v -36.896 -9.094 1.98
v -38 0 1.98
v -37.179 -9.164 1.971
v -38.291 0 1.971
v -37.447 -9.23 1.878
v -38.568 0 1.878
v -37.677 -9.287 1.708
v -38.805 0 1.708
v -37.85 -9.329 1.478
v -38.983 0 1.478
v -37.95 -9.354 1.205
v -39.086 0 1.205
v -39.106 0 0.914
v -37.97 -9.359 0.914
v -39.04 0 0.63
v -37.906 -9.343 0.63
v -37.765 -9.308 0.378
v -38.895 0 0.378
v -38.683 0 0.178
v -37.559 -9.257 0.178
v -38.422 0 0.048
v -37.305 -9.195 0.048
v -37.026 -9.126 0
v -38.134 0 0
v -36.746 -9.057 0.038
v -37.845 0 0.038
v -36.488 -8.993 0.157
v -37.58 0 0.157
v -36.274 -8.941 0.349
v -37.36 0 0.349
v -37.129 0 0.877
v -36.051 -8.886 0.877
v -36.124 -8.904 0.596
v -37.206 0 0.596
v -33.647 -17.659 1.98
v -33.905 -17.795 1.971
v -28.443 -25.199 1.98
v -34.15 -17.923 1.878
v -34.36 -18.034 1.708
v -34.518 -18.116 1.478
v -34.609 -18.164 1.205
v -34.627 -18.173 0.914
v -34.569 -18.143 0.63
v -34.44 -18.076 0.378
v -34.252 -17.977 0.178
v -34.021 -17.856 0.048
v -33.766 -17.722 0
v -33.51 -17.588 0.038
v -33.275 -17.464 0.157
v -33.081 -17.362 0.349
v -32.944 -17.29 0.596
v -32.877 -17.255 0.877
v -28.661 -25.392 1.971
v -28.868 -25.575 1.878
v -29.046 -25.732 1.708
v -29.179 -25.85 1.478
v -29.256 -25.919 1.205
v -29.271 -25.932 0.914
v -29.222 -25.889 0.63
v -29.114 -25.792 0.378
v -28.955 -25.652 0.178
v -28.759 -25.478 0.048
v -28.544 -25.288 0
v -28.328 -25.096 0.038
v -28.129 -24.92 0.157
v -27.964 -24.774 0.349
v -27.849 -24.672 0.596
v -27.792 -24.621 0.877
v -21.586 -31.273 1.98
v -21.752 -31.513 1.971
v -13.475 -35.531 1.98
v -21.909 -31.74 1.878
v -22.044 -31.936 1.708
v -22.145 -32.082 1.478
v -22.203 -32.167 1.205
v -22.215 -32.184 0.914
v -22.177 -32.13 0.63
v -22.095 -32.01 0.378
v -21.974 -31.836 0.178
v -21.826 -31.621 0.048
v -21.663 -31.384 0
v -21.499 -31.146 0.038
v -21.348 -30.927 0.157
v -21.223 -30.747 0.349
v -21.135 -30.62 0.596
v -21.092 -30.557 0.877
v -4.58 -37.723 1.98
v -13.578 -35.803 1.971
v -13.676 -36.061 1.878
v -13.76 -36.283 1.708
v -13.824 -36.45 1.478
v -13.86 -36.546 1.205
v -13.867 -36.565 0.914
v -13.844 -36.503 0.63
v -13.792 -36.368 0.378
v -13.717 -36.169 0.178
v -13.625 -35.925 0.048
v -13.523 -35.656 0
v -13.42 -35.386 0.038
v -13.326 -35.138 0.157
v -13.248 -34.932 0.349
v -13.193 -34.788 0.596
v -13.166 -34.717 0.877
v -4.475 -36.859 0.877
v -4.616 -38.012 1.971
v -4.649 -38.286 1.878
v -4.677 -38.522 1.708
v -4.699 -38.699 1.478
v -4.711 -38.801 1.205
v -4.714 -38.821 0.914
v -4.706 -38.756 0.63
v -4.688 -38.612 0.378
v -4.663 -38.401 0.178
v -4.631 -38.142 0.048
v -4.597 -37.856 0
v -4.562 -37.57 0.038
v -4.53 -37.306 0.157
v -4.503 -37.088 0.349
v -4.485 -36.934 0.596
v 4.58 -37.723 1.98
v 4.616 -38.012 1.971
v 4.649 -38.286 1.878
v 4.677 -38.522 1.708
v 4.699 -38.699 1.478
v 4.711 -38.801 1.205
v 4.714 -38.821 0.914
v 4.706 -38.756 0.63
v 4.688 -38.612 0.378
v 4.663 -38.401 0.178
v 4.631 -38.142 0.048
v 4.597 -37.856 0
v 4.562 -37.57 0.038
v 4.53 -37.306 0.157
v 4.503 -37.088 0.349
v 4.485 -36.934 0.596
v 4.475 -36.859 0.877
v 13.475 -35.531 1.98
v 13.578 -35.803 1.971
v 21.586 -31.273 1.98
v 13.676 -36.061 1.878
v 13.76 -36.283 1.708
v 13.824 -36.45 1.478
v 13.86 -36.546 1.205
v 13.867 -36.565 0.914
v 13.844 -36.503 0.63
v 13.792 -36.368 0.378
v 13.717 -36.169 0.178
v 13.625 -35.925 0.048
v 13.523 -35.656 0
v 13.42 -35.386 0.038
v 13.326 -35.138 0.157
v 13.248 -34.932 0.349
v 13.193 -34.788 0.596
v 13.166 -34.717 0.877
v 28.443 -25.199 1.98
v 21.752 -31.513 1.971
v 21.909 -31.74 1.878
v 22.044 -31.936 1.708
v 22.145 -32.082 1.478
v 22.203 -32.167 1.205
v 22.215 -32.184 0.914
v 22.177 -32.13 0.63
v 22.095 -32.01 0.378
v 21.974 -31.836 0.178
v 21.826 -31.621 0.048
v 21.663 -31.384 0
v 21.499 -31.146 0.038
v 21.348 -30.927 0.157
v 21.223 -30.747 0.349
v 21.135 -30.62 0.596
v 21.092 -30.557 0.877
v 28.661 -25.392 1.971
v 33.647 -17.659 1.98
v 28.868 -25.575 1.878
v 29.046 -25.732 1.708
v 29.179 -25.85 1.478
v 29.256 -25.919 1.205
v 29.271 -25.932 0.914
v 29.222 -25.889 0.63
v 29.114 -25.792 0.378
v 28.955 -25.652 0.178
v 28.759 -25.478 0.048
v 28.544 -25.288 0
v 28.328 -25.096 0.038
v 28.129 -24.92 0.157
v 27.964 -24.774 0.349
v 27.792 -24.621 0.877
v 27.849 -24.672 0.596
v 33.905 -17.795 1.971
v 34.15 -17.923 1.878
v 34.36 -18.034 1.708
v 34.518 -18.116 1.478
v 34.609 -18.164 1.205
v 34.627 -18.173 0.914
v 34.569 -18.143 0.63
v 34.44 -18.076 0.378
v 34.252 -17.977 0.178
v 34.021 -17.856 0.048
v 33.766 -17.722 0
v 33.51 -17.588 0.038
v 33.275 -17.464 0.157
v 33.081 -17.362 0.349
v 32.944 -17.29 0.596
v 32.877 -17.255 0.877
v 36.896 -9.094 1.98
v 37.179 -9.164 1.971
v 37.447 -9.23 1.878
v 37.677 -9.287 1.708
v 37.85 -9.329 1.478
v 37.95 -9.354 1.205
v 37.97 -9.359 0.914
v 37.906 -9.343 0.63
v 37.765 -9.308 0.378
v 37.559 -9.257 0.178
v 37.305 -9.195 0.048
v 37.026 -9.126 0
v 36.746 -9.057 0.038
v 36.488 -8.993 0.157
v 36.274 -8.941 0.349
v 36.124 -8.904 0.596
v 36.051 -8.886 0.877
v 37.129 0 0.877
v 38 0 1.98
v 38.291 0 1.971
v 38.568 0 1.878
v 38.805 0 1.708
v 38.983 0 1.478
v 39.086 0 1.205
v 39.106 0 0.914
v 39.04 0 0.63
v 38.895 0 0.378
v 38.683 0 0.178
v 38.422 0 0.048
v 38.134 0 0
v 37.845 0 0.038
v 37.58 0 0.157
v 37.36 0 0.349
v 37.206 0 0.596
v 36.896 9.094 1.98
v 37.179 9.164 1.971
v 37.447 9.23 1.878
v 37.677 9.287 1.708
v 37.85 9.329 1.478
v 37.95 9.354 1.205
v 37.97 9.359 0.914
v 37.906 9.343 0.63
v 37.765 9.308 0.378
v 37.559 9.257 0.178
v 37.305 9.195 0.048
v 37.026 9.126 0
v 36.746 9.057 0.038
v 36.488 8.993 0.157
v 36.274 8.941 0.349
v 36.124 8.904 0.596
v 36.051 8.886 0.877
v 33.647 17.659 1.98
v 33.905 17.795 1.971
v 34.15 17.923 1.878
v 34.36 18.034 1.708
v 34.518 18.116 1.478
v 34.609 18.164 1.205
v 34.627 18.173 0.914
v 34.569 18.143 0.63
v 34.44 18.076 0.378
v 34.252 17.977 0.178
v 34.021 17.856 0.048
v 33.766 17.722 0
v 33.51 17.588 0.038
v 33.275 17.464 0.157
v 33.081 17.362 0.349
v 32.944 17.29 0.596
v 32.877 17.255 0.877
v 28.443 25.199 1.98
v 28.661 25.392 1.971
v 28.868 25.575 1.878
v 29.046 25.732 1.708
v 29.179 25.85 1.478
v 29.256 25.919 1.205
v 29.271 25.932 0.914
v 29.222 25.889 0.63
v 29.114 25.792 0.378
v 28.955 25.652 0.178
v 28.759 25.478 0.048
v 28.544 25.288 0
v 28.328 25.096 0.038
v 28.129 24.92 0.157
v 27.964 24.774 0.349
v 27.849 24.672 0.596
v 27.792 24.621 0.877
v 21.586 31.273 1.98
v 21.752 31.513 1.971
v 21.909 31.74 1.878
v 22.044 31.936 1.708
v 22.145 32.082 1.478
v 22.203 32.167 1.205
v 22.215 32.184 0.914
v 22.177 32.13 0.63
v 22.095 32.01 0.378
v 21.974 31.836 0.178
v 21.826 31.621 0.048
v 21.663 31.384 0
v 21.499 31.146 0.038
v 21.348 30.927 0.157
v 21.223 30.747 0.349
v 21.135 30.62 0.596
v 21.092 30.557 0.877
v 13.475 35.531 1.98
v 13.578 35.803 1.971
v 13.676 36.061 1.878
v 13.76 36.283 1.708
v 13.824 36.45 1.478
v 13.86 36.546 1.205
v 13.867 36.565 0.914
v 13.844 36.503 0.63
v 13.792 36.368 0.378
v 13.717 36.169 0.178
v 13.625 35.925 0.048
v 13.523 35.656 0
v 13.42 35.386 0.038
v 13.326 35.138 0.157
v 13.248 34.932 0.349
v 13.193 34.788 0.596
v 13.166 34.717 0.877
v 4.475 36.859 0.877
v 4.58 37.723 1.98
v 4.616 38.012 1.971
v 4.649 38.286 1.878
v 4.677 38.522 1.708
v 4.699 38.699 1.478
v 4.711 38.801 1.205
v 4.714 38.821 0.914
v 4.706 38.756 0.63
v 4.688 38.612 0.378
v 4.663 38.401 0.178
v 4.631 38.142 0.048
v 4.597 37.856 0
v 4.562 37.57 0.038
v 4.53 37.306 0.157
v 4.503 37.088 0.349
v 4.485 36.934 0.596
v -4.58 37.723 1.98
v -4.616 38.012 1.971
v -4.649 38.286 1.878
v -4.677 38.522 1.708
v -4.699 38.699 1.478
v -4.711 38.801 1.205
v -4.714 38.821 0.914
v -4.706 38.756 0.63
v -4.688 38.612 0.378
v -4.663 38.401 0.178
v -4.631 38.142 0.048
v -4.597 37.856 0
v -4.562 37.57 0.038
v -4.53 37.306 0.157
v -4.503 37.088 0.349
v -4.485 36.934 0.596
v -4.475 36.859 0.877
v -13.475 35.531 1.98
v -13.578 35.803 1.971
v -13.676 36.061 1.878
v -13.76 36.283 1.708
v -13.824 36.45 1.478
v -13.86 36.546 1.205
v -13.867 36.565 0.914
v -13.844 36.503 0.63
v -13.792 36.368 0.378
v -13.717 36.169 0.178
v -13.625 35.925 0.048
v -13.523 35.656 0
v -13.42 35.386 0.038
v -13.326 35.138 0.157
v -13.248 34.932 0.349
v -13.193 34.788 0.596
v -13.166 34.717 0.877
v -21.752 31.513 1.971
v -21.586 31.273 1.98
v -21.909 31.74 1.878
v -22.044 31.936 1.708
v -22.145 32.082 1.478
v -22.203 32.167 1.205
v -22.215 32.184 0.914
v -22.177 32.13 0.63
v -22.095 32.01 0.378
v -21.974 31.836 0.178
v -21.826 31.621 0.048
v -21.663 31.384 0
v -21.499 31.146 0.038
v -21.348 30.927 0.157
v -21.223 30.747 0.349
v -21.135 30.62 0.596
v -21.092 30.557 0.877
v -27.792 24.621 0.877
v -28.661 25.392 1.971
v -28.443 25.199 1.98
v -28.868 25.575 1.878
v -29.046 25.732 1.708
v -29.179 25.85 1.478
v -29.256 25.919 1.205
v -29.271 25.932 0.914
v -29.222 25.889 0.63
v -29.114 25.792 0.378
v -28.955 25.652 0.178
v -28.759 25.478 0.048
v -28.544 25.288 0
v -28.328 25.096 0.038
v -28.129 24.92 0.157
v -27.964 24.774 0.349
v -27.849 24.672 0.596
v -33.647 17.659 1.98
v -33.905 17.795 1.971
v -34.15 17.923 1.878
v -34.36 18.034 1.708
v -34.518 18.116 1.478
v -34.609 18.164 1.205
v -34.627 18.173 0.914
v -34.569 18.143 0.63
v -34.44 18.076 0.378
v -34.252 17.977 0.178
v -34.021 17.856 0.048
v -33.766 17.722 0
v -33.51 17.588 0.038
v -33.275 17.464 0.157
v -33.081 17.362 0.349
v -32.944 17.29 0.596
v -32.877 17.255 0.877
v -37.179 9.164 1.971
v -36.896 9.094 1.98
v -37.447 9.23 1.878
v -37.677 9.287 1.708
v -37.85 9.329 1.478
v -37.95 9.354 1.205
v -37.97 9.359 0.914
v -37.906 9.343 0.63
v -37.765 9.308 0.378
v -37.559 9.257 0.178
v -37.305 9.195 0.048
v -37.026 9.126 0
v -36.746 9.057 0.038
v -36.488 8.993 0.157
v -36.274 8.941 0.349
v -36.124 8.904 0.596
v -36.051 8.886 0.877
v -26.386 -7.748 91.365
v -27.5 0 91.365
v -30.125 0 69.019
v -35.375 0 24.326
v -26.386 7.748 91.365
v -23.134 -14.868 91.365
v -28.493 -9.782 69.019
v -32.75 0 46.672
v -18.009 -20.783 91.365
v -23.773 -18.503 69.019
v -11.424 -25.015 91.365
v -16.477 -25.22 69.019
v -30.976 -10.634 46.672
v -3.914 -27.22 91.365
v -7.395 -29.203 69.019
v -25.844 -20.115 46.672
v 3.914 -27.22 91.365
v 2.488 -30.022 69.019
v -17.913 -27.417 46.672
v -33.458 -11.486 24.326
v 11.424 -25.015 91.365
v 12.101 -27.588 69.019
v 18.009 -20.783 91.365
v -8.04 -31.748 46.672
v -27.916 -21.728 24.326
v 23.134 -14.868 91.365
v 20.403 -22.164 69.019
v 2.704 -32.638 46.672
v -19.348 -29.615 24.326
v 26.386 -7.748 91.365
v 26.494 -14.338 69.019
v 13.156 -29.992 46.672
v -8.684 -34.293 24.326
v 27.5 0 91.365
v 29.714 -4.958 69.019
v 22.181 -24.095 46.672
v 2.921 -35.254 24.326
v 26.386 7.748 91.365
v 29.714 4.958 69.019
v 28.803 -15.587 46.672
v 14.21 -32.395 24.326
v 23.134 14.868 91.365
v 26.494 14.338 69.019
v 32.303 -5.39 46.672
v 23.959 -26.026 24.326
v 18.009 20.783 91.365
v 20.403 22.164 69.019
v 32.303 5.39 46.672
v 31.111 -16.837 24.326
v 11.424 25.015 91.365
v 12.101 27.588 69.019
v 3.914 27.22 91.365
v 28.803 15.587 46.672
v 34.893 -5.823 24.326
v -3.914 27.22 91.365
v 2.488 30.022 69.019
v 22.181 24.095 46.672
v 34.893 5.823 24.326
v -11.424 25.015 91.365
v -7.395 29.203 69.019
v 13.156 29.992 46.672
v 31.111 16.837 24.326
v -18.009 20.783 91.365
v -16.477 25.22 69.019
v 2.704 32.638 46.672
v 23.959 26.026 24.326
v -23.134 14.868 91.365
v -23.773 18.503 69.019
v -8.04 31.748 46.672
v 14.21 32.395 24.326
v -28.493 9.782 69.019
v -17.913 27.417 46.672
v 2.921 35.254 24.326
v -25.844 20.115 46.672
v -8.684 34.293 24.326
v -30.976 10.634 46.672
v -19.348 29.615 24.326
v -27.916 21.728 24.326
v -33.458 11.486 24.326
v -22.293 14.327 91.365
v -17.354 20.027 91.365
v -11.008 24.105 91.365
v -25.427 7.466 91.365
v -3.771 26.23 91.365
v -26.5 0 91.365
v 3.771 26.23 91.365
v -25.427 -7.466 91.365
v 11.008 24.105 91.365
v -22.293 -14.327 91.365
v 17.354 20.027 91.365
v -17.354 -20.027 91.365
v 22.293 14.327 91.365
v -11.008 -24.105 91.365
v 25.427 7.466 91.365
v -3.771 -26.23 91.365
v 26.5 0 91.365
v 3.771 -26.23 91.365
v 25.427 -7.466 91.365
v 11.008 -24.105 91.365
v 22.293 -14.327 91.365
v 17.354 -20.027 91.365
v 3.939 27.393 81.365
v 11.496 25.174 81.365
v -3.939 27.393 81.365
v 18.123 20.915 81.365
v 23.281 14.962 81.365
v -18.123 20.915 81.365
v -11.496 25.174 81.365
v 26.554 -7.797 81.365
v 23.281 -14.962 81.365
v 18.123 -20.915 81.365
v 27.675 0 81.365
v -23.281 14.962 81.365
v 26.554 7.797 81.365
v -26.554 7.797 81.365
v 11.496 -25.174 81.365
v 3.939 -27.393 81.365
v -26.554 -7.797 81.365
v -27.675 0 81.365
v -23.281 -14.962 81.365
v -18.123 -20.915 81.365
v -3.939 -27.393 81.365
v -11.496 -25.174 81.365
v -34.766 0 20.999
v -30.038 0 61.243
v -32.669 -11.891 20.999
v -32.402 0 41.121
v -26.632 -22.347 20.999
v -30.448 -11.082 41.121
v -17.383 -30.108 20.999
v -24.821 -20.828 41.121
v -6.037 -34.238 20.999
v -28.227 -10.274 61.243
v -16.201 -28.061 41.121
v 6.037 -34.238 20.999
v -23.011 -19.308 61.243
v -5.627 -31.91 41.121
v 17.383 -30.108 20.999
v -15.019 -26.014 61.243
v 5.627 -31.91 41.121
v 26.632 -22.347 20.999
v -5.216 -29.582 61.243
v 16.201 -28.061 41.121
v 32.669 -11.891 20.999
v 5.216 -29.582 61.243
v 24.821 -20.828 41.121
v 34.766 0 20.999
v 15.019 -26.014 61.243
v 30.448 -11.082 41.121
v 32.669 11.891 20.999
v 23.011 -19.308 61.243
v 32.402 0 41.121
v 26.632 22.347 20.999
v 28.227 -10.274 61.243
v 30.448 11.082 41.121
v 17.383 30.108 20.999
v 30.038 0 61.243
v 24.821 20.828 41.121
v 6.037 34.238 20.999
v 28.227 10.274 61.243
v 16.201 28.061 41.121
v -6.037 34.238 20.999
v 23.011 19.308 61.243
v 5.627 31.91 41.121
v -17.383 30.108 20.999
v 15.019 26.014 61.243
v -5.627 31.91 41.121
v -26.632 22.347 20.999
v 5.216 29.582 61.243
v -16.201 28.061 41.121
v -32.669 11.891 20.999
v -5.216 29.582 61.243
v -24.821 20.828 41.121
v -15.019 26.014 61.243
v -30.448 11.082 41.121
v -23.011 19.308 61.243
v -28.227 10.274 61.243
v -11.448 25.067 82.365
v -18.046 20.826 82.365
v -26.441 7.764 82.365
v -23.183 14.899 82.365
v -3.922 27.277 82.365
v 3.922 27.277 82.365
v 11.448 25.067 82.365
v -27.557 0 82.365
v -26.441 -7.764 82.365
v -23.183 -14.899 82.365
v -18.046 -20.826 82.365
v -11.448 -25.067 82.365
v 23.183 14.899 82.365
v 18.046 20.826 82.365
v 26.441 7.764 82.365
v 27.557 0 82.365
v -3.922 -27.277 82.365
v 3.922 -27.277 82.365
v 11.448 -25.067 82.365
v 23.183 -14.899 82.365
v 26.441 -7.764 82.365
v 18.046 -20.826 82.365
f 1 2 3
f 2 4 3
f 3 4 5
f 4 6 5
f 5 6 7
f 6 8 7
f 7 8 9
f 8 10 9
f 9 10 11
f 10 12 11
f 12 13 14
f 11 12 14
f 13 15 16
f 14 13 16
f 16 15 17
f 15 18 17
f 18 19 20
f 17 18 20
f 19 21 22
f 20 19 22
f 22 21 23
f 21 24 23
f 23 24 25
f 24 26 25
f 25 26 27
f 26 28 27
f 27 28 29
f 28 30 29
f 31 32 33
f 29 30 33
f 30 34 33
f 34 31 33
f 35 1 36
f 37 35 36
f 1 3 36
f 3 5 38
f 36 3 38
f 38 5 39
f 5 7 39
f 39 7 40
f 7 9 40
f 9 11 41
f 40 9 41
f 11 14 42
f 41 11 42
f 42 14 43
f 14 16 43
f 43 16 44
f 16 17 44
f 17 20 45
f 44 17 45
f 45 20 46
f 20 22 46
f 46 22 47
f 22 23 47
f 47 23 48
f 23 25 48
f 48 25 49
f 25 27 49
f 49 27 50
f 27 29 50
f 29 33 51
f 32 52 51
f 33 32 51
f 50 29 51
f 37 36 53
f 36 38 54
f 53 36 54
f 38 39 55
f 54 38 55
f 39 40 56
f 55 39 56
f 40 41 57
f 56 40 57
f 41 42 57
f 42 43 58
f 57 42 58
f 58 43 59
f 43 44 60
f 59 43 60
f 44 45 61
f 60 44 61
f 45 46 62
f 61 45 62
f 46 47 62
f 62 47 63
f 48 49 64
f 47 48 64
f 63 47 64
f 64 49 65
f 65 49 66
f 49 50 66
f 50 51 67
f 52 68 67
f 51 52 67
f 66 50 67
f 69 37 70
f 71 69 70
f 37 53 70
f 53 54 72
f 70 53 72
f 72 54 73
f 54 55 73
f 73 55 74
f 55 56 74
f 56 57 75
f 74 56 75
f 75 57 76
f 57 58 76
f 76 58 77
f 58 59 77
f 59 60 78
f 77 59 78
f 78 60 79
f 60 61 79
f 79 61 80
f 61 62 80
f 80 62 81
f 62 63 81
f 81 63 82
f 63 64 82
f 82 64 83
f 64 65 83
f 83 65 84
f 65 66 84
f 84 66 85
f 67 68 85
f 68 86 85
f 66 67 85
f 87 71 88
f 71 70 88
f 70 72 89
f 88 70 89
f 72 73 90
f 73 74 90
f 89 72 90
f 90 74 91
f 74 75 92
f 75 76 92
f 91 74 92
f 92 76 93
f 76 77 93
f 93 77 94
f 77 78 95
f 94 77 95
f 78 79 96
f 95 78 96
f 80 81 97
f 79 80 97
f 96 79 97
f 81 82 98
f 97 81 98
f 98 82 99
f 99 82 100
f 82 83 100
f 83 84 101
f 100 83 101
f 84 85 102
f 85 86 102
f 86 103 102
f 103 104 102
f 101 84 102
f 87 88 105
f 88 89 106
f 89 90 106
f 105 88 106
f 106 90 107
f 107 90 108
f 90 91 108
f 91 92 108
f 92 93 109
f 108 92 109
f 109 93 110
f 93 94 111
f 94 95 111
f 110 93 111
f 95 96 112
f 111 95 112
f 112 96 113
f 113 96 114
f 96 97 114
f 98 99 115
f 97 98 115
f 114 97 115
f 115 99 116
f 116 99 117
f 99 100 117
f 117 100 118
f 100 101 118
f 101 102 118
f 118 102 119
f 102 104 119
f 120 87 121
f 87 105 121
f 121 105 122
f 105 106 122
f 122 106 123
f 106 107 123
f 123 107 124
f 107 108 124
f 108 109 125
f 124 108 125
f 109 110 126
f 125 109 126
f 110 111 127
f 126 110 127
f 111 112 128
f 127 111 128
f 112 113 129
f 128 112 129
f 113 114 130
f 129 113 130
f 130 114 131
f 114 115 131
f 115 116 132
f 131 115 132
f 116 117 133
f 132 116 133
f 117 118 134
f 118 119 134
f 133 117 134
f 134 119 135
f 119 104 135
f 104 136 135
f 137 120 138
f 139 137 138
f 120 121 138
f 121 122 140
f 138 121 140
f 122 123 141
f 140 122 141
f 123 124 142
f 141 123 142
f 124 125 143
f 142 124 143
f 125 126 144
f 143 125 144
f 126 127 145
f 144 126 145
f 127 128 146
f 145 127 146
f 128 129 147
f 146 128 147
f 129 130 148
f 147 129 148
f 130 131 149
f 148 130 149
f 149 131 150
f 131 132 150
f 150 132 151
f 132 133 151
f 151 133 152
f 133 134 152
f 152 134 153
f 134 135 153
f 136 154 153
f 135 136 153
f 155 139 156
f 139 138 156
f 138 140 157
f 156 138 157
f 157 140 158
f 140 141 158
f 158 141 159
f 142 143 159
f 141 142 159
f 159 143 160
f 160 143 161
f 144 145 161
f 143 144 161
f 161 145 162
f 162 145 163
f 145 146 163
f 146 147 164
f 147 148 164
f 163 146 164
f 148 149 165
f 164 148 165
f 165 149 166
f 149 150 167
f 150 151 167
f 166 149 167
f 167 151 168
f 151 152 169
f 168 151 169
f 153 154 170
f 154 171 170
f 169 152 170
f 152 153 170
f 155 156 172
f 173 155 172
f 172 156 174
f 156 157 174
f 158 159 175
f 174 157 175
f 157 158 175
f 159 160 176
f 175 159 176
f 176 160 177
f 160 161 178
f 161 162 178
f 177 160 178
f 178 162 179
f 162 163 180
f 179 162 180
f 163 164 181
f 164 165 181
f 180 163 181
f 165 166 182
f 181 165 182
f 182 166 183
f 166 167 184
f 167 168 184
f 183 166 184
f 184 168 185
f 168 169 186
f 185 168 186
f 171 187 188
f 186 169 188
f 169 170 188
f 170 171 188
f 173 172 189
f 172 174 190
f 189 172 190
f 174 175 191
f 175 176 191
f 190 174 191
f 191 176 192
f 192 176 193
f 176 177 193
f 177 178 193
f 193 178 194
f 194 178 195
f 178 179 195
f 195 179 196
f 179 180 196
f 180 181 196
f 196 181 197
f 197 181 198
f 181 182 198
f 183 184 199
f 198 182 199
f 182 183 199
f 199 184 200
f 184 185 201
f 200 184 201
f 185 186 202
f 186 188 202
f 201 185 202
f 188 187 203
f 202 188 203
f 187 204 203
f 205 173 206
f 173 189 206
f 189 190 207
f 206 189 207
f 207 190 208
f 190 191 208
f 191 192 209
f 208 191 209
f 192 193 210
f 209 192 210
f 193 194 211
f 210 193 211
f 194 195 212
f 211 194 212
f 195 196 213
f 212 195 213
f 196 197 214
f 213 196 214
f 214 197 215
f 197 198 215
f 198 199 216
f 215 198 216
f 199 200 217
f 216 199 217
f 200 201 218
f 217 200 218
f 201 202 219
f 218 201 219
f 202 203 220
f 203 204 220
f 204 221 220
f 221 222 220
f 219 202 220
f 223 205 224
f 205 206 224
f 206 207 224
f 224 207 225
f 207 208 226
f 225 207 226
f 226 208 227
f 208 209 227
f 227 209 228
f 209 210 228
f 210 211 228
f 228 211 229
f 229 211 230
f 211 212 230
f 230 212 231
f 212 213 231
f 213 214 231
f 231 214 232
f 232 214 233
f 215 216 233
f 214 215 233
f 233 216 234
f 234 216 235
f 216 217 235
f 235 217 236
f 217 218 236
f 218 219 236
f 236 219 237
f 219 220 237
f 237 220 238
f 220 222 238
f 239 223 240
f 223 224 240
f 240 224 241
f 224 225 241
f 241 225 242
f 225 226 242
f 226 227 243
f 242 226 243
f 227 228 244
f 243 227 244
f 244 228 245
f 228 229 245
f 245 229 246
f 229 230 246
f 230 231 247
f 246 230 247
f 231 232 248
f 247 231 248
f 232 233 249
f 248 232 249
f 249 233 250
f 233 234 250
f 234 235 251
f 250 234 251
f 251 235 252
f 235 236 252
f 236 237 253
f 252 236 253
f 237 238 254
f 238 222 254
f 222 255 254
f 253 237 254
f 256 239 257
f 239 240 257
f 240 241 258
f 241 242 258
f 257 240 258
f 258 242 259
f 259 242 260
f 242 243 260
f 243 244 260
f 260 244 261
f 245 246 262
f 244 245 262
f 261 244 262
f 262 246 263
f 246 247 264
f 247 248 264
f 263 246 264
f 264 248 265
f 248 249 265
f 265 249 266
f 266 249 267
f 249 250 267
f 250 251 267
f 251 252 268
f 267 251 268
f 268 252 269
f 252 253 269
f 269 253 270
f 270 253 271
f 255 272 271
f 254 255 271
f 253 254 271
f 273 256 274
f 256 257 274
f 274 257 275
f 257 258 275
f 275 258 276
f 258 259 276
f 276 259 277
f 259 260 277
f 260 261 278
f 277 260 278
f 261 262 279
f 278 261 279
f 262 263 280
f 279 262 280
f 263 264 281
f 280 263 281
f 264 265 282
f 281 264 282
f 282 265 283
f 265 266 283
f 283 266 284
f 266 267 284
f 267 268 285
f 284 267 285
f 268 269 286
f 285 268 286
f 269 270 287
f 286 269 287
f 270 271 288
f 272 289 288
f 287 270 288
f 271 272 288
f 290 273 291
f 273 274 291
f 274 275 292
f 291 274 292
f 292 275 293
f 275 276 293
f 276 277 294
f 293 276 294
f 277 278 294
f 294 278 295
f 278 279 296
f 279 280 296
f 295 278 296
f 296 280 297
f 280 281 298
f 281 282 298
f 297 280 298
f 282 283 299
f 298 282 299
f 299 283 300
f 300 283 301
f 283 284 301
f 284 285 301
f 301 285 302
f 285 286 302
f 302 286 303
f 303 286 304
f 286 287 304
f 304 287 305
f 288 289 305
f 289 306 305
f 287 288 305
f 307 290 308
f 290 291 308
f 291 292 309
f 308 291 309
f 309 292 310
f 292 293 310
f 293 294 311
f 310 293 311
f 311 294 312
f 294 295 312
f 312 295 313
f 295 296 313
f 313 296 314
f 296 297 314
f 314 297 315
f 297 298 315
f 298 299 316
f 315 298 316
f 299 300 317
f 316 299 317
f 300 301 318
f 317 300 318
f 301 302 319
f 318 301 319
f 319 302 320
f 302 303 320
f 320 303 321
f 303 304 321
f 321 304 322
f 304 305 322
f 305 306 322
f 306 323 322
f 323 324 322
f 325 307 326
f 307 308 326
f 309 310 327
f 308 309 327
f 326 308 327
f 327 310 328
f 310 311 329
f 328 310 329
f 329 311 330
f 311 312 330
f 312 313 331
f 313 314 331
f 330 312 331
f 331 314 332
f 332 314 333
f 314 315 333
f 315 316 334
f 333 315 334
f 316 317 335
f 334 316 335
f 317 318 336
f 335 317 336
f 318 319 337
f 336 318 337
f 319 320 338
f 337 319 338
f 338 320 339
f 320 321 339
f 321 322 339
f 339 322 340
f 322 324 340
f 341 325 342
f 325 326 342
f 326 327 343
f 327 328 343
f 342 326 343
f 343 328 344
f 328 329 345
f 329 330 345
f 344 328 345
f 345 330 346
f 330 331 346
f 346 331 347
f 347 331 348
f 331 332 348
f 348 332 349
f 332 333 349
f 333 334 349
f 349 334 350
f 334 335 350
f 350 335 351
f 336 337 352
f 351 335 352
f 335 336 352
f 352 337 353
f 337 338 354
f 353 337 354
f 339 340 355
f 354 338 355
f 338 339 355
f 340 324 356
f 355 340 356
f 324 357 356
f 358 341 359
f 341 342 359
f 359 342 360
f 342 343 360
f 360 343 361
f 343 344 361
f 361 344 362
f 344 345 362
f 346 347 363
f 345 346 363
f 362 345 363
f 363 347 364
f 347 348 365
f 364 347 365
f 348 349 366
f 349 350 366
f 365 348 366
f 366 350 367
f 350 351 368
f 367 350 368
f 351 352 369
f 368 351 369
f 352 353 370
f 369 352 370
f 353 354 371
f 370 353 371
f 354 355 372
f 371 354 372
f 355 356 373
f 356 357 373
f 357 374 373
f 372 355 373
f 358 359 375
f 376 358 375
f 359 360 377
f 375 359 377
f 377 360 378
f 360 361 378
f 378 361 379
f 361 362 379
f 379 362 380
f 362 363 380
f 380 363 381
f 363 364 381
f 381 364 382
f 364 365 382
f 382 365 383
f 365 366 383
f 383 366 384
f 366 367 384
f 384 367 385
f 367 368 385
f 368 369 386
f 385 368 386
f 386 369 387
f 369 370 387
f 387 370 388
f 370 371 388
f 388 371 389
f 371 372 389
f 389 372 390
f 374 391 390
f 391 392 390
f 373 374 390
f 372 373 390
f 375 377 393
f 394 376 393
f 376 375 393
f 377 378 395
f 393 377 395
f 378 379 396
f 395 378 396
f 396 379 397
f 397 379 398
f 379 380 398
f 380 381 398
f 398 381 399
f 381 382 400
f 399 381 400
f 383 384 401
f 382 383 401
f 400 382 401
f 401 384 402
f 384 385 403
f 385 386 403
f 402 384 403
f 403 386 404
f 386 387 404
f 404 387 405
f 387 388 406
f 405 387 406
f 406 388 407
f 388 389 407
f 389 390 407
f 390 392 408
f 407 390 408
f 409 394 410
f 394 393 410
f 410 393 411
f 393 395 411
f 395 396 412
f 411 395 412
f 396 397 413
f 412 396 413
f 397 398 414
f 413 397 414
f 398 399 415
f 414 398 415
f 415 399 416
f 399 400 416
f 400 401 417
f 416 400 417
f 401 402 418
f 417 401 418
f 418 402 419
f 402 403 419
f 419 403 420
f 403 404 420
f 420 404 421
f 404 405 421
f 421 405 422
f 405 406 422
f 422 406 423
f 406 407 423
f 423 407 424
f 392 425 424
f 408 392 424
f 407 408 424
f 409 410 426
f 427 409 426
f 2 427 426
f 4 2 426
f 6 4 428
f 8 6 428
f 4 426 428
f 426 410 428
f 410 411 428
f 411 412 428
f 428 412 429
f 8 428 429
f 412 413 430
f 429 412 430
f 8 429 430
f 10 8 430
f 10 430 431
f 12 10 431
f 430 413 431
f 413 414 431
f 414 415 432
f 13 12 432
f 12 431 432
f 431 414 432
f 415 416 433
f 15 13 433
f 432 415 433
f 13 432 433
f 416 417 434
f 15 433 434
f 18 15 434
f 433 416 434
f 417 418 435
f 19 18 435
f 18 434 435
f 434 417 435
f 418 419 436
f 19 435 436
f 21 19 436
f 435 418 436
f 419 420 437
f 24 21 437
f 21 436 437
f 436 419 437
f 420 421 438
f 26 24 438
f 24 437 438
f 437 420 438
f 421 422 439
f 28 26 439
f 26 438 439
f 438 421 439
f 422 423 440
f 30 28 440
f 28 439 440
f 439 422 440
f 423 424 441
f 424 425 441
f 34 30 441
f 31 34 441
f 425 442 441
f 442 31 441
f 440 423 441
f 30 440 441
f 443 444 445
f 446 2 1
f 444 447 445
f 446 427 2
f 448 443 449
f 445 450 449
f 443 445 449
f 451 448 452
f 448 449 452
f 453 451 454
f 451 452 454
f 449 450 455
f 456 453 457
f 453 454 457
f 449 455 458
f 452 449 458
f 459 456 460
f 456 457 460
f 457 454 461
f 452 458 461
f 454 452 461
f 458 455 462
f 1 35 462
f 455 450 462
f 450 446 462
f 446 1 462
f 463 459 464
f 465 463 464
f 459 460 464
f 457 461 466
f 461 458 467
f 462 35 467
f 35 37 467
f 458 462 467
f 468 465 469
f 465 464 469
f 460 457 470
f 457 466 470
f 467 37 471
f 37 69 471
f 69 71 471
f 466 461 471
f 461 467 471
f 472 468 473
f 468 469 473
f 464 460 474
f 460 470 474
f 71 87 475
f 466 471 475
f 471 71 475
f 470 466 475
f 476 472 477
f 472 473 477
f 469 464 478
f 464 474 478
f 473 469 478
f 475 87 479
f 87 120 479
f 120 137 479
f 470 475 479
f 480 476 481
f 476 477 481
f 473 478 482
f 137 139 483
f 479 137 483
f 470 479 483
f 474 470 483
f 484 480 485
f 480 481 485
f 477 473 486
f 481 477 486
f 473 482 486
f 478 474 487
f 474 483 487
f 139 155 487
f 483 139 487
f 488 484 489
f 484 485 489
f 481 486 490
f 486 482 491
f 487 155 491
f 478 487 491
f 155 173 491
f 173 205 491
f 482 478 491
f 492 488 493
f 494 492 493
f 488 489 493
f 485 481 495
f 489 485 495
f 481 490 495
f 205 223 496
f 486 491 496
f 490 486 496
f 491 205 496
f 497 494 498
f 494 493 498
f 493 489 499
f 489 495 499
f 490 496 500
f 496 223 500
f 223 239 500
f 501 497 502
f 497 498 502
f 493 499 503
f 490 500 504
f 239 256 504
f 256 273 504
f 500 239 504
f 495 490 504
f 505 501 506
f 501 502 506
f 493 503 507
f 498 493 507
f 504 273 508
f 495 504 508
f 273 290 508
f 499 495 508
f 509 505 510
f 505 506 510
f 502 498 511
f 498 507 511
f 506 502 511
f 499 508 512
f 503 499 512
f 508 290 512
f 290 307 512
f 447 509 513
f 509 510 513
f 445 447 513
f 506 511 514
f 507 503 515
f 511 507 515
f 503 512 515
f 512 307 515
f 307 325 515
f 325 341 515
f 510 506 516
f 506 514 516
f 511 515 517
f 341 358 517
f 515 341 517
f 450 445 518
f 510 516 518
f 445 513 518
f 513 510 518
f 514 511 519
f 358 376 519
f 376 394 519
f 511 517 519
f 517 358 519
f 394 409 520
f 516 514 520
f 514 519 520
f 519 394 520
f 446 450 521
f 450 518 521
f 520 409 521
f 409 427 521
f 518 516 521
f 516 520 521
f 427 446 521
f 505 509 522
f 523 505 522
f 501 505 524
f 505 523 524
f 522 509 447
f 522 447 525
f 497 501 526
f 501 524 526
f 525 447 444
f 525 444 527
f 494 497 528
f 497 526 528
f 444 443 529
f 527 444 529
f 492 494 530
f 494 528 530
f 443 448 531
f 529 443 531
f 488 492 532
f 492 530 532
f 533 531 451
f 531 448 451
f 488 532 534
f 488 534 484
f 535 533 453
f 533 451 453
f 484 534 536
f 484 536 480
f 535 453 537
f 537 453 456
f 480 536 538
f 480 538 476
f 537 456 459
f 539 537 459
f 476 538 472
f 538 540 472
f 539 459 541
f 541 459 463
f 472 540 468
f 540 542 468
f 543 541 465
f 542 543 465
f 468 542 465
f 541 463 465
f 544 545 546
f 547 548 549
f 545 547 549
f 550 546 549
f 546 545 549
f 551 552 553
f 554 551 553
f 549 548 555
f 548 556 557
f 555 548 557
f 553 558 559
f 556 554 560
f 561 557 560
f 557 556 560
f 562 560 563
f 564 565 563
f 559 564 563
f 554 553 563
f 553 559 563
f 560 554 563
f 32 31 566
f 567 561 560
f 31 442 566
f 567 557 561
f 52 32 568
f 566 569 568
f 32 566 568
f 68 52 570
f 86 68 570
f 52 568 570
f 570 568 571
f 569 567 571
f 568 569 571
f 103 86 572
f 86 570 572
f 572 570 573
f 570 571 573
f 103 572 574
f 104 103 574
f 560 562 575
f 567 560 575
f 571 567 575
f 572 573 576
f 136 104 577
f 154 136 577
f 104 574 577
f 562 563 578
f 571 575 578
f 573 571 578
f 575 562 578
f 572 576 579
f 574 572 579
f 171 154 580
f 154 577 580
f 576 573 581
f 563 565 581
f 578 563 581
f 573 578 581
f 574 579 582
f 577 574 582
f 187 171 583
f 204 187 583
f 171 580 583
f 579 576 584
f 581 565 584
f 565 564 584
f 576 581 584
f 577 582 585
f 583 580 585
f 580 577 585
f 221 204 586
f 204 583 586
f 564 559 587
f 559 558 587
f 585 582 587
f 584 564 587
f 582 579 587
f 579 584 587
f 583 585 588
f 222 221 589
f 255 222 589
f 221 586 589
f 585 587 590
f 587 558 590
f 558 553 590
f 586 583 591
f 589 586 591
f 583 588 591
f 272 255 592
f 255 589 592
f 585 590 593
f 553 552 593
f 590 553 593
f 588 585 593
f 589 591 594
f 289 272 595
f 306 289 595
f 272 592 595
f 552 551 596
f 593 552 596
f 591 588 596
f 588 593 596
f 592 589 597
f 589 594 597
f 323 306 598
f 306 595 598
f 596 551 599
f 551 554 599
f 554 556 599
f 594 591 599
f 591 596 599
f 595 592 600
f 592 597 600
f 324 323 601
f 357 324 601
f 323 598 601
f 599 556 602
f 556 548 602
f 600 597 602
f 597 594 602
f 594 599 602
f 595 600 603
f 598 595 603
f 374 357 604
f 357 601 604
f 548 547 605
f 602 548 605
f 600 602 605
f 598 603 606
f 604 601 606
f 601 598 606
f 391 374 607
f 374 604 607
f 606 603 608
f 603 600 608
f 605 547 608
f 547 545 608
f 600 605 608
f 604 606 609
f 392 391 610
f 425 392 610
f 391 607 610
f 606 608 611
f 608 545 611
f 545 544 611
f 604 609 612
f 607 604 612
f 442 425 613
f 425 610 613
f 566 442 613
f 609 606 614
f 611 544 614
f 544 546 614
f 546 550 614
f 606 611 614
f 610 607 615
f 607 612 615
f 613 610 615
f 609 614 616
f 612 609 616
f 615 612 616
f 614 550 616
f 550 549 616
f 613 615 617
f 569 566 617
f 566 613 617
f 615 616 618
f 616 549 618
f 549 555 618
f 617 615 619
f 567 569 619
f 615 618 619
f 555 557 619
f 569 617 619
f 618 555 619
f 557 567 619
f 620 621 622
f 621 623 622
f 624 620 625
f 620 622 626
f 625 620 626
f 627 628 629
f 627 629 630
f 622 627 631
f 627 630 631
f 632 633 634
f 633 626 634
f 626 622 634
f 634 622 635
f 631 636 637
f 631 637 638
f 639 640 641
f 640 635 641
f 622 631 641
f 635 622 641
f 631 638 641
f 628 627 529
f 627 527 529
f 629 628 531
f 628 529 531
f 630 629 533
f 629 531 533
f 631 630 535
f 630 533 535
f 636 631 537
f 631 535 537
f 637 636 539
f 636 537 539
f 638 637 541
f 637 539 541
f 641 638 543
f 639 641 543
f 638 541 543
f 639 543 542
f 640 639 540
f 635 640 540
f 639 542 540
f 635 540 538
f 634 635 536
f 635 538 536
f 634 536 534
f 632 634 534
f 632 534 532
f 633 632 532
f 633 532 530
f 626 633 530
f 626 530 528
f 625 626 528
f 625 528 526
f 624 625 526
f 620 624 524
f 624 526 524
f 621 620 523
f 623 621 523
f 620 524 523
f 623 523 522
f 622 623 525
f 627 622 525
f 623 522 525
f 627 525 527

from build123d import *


with BuildPart() as part:
    # Sketch → Revolution (revolve)
    with BuildSketch(Plane.XZ):
        with BuildLine():
            Line((0, 82.364962), (-27.55722, 82.364962))
            Line((-27.55722, 82.364962), (-26.5, 91.364962))
            Line((-26.5, 91.364962), (-27.5, 91.364962))
            Line((-27.5, 91.364962), (-38, 1.97956))
            ThreePointArc((-38, 1.97956), (-38.895285, 0.377621), (-37.129481, 0.877301))
            Line((-37.129481, 0.877301), (-27.674688, 81.364962))
            Line((-27.674688, 81.364962), (0, 81.364962))
            Line((0, 81.364962), (0, 82.364962))
        make_face()
    revolve(axis=Axis((0, 0, 0), (0, 0, 1)))


solid = part.part
